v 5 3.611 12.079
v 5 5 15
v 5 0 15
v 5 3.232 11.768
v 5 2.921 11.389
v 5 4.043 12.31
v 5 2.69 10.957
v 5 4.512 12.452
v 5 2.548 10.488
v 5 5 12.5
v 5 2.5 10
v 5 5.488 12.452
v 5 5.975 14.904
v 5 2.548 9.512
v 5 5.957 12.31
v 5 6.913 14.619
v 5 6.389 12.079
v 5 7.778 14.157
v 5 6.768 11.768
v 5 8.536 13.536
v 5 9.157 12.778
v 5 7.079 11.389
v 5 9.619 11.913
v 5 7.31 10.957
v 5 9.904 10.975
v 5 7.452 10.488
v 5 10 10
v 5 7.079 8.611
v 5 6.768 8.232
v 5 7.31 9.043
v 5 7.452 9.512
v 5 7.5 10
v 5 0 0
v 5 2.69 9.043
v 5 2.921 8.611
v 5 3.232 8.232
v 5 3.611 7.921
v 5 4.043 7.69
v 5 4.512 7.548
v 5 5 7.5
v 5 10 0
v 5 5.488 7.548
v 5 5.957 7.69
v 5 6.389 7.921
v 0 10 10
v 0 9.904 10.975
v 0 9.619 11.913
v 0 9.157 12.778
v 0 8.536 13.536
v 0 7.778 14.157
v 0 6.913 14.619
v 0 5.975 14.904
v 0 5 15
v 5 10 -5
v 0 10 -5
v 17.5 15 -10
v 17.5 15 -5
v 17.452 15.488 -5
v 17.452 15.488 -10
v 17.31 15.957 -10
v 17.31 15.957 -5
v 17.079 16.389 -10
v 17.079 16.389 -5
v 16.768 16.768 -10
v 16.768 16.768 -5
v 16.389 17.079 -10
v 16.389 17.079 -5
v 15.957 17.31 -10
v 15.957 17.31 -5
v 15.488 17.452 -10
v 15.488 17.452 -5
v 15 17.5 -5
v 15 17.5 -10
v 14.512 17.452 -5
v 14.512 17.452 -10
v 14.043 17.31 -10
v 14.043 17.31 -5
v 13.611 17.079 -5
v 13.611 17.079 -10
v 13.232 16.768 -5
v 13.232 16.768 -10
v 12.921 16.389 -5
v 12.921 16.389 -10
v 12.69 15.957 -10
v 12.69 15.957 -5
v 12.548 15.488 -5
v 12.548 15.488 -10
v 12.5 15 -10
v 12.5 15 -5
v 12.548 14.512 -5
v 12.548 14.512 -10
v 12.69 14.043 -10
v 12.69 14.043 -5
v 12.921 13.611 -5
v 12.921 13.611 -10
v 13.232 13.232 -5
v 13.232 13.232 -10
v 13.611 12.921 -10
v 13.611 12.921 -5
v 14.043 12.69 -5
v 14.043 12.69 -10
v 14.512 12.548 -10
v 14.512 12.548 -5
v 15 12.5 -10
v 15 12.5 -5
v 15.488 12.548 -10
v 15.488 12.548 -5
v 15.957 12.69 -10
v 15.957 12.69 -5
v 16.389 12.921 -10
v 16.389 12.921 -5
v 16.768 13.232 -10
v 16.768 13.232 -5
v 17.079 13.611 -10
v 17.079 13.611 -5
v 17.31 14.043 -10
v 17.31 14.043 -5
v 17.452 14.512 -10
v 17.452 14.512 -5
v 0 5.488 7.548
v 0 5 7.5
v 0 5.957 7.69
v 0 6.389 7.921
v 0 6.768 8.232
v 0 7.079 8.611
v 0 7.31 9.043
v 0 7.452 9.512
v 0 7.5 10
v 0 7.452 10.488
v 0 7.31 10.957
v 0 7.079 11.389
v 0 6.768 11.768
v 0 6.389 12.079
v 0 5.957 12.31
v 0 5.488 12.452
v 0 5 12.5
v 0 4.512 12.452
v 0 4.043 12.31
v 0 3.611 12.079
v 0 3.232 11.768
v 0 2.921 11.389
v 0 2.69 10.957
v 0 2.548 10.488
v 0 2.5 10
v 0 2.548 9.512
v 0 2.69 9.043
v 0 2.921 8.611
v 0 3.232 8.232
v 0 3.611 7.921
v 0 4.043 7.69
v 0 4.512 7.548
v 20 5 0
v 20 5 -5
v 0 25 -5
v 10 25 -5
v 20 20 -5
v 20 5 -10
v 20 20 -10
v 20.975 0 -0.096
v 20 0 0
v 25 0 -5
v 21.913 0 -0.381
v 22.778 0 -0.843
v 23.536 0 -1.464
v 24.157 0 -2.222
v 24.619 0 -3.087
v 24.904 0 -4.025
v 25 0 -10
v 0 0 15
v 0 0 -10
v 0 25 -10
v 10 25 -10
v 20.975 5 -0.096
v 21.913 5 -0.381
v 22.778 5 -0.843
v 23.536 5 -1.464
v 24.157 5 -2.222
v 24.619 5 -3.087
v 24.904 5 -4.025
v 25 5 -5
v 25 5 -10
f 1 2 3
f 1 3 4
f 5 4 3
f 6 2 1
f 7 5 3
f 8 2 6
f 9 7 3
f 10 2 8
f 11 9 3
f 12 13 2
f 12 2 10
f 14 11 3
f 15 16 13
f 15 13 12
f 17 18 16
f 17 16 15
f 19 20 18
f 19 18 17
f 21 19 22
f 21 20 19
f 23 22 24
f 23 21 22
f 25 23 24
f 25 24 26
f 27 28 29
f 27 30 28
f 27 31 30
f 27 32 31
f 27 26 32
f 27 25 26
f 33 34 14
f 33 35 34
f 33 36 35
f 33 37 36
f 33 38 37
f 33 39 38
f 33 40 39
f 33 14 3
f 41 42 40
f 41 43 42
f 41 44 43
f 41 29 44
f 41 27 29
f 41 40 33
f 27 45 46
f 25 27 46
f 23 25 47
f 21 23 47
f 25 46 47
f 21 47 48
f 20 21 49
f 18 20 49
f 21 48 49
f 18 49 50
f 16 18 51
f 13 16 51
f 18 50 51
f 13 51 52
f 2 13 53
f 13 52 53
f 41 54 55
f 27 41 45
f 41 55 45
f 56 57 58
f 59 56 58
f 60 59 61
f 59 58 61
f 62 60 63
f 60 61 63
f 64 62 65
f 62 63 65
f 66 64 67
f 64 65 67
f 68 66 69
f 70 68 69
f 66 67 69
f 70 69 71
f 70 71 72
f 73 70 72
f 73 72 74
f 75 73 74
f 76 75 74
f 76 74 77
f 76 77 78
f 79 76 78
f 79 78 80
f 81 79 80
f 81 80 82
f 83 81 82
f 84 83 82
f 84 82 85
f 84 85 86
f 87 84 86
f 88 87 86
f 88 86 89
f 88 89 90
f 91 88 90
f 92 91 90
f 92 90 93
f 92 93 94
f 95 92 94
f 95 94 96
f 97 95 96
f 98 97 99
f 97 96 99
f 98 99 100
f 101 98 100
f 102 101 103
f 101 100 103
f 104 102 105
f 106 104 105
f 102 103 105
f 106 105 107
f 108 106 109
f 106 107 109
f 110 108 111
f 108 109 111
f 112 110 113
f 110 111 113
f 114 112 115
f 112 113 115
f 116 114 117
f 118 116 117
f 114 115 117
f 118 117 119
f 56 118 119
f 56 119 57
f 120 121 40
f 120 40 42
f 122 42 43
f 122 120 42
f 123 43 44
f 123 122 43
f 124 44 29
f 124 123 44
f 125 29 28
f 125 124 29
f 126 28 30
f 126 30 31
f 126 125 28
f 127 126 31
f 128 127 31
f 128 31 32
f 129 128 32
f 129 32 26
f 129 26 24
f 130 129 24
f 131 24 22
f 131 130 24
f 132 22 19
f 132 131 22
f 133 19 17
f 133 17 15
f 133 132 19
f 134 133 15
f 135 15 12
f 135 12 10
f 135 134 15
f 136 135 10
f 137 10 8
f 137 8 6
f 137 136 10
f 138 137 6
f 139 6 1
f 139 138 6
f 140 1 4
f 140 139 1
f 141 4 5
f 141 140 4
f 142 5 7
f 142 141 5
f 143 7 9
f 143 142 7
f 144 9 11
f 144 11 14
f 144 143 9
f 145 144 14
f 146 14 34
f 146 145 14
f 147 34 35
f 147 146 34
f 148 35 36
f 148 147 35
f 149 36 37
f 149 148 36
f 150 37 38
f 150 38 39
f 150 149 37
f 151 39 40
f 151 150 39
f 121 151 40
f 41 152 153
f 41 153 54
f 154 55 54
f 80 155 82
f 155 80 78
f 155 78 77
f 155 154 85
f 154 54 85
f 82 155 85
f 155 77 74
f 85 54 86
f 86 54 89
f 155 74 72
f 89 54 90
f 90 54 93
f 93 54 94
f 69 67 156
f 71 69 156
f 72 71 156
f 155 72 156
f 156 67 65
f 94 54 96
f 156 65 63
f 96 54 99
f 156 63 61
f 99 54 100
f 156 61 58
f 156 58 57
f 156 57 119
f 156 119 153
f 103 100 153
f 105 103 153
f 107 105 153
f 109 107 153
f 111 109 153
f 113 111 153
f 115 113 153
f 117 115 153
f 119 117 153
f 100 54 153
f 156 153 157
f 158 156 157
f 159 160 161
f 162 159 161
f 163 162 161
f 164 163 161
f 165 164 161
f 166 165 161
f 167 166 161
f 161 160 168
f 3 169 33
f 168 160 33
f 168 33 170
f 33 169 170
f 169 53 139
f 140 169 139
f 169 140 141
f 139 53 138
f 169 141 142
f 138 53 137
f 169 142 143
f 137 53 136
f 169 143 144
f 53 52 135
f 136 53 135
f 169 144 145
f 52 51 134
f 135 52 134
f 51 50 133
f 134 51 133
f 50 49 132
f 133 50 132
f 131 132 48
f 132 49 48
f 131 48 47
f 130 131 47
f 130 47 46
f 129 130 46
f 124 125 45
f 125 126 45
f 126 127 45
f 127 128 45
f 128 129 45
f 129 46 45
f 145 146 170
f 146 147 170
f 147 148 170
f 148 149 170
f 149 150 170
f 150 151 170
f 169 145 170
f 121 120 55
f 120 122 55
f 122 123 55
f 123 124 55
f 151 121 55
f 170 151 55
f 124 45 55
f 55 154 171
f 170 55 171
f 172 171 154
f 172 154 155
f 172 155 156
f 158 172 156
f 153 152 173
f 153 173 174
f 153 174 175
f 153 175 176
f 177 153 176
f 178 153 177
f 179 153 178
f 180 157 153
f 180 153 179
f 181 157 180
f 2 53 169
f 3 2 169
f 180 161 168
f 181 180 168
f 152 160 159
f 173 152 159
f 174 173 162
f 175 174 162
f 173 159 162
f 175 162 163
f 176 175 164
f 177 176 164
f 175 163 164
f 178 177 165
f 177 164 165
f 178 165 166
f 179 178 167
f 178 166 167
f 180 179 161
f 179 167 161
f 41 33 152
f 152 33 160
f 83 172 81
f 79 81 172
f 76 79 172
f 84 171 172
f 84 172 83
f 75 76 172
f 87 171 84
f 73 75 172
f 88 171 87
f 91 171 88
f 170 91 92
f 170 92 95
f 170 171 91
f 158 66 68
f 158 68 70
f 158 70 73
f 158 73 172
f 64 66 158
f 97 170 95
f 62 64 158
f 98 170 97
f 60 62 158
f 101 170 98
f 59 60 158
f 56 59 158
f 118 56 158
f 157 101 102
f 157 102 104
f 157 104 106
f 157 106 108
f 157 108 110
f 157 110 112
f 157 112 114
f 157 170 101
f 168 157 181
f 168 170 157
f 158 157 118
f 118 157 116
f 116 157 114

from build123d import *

# Parameters (mm, degrees)
EXTRUDE_1_DEPTH     = 5
SKETCH_1_3_W        = 20
SKETCH_1_3_H        = 5
EXTRUDE_2_DEPTH     = 10
SKETCH_1_4_W        = 20
SKETCH_1_4_H        = 5
EXTRUDE_3_DEPTH     = 25
SKETCH_2_R          = 2.5
CUT_EXTRUDE_1_DEPTH = 25
CUT_EXTRUDE_2_DEPTH = 5
SKETCH_4_R          = 2.5
EXTRUDE_4_DEPTH     = 5


with BuildPart() as part:
    # 草圖1 → 填料-伸長1 (new body)
    with BuildSketch(Plane(origin=(0, 0, 0), x_dir=(1, 0, 0), z_dir=(0, 1, 0))):
        with BuildLine():
            Line((20, 10), (20, 5))
            Line((20, 5), (20, 0))
            ThreePointArc((20, 0), (23.535533906, 1.464466094), (25, 5))
            Line((25, 5), (25, 10))
            Line((25, 10), (20, 10))
        make_face()
    extrude(amount=EXTRUDE_1_DEPTH)

    # 草圖1<3> → 填料-伸長2 (add)
    with BuildSketch(Plane(origin=(0, 0, 0), x_dir=(1, 0, 0), z_dir=(0, 1, 0))):
        with Locations((10, 2.5)):
            Rectangle(SKETCH_1_3_W, SKETCH_1_3_H)
    extrude(amount=EXTRUDE_2_DEPTH)

    # 草圖1<4> → 填料-伸長3 (add)
    with BuildSketch(Plane(origin=(0, 0, 0), x_dir=(1, 0, 0), z_dir=(0, 1, 0))):
        with Locations((10, 7.5)):
            Rectangle(SKETCH_1_4_W, SKETCH_1_4_H)
    extrude(amount=EXTRUDE_3_DEPTH)

    # 草圖2 → 除料-伸長1 (cut)
    with BuildSketch(Plane.XY.offset(-5)):
        with Locations((15, 15)):
            Circle(SKETCH_2_R)
        Polygon((10, 25), (20, 20), (20, 25), align=None)
    extrude(amount=-CUT_EXTRUDE_1_DEPTH, mode=Mode.SUBTRACT)

    # 草圖3 → 除料-伸長2 (cut)
    with BuildSketch(Plane.XY):
        Polygon((20, 5), (5, 10), (20, 10), align=None)
    extrude(amount=-CUT_EXTRUDE_2_DEPTH, mode=Mode.SUBTRACT)

    # 草圖4 → 填料-伸長4 (add)
    with BuildSketch(Plane(origin=(0, 0, 0), x_dir=(0, 0, -1), z_dir=(1, 0, 0))):
        with BuildLine():
            Line((0, 10), (-10, 10))
            ThreePointArc((-10, 10), (-13.535533906, 8.535533906), (-15, 5))
            Line((-15, 5), (-15, 0))
            Line((-15, 0), (0, 0))
            Line((0, 0), (0, 10))
        make_face()
        with Locations((-10, 5)):
            Circle(SKETCH_4_R, mode=Mode.SUBTRACT)
    extrude(amount=EXTRUDE_4_DEPTH)


solid = part.part
